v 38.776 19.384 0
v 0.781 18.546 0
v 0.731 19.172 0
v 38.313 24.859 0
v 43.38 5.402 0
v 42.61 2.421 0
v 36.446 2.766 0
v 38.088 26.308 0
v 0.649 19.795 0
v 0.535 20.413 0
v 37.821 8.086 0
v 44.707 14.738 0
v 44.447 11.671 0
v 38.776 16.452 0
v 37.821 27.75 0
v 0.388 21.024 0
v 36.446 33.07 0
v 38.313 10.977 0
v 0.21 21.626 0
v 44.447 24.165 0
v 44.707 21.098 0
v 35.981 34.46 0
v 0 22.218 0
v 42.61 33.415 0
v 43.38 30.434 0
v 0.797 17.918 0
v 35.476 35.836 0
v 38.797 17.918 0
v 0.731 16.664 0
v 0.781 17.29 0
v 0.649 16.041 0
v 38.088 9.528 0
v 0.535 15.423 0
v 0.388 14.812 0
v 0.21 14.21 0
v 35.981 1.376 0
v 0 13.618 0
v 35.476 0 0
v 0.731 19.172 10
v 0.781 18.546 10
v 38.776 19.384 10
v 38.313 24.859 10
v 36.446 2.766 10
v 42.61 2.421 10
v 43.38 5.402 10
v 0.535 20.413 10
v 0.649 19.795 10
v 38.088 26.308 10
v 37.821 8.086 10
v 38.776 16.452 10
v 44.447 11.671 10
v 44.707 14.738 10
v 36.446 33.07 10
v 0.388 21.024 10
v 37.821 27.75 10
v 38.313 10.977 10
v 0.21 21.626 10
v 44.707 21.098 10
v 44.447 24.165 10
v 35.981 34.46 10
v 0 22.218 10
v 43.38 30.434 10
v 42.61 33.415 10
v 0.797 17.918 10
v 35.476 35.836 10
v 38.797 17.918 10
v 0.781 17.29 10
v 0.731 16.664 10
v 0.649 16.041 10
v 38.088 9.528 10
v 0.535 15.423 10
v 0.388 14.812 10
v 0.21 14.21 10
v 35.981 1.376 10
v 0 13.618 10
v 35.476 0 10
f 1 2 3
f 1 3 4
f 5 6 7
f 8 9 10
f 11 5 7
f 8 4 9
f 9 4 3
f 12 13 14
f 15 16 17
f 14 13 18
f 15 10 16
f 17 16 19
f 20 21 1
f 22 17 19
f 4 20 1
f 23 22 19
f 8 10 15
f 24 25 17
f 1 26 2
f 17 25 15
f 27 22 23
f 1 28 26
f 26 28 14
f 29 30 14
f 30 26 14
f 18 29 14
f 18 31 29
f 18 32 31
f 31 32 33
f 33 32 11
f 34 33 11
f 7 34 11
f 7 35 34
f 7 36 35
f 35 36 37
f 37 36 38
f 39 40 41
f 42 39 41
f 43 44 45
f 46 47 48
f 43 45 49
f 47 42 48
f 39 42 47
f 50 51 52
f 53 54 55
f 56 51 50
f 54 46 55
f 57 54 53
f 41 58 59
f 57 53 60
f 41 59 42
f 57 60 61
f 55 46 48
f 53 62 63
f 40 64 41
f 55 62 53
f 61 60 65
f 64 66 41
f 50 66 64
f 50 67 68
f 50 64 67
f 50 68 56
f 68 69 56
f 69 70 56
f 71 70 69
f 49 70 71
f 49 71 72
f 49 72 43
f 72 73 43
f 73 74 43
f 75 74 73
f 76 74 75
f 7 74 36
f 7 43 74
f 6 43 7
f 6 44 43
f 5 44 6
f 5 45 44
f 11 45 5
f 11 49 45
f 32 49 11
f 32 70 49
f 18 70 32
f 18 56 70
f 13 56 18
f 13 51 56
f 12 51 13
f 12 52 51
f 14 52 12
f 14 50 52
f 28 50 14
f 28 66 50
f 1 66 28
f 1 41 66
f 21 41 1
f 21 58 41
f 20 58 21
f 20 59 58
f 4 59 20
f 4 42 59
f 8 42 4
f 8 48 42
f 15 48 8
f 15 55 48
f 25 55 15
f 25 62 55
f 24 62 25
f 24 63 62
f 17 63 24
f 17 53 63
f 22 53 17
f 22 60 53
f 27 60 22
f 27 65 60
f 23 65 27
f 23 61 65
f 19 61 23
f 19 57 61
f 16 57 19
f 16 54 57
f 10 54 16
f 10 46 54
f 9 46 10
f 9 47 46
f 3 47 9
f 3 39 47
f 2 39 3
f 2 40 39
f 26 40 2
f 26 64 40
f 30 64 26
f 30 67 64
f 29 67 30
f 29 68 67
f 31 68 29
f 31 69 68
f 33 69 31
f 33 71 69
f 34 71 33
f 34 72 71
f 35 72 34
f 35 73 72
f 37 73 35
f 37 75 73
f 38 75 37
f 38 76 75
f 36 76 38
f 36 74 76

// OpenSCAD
$fn = 32;

// ----------------------------------------------------------------------
// Gear sector: 4 teeth on 42 degrees
// ----------------------------------------------------------------------

// --- parameters (mm) ---
sector_angle = 42;        // sector angle, degrees
root_r = 50;              // root circle radius
tooth_h = 6;              // tooth height over the root circle
teeth = 4;                // number of teeth on the sector
hub_r = 12;               // hub bore radius
plate_t = 10;             // sector thickness, Z
arc_step = 3;             // sampling step of the root/hub arcs, degrees

tip_r = root_r + tooth_h;  // tip circle radius

profile = [[35.476, 0], [35.981, 1.376], [36.446, 2.766], [42.61, 2.421], [43.38, 5.402], [37.821, 8.086], [38.088, 9.528], [38.313, 10.977], [44.447, 11.671], [44.707, 14.738], [38.776, 16.452], [38.797, 17.918], [38.776, 19.384], [44.707, 21.098], [44.447, 24.165], [38.313, 24.859], [38.088, 26.308], [37.821, 27.75], [43.38, 30.434], [42.61, 33.415], [36.446, 33.07], [35.981, 34.46], [35.476, 35.836], [0, 22.218], [0.21, 21.626], [0.388, 21.024], [0.535, 20.413], [0.649, 19.795], [0.731, 19.172], [0.781, 18.546], [0.797, 17.918], [0.781, 17.29], [0.731, 16.664], [0.649, 16.041], [0.535, 15.423], [0.388, 14.812], [0.21, 14.21], [0, 13.618]];  // primary outline, 38 points, counter clockwise

// --- the one profile operation ---
linear_extrude(height = plate_t) polygon(points = profile);
